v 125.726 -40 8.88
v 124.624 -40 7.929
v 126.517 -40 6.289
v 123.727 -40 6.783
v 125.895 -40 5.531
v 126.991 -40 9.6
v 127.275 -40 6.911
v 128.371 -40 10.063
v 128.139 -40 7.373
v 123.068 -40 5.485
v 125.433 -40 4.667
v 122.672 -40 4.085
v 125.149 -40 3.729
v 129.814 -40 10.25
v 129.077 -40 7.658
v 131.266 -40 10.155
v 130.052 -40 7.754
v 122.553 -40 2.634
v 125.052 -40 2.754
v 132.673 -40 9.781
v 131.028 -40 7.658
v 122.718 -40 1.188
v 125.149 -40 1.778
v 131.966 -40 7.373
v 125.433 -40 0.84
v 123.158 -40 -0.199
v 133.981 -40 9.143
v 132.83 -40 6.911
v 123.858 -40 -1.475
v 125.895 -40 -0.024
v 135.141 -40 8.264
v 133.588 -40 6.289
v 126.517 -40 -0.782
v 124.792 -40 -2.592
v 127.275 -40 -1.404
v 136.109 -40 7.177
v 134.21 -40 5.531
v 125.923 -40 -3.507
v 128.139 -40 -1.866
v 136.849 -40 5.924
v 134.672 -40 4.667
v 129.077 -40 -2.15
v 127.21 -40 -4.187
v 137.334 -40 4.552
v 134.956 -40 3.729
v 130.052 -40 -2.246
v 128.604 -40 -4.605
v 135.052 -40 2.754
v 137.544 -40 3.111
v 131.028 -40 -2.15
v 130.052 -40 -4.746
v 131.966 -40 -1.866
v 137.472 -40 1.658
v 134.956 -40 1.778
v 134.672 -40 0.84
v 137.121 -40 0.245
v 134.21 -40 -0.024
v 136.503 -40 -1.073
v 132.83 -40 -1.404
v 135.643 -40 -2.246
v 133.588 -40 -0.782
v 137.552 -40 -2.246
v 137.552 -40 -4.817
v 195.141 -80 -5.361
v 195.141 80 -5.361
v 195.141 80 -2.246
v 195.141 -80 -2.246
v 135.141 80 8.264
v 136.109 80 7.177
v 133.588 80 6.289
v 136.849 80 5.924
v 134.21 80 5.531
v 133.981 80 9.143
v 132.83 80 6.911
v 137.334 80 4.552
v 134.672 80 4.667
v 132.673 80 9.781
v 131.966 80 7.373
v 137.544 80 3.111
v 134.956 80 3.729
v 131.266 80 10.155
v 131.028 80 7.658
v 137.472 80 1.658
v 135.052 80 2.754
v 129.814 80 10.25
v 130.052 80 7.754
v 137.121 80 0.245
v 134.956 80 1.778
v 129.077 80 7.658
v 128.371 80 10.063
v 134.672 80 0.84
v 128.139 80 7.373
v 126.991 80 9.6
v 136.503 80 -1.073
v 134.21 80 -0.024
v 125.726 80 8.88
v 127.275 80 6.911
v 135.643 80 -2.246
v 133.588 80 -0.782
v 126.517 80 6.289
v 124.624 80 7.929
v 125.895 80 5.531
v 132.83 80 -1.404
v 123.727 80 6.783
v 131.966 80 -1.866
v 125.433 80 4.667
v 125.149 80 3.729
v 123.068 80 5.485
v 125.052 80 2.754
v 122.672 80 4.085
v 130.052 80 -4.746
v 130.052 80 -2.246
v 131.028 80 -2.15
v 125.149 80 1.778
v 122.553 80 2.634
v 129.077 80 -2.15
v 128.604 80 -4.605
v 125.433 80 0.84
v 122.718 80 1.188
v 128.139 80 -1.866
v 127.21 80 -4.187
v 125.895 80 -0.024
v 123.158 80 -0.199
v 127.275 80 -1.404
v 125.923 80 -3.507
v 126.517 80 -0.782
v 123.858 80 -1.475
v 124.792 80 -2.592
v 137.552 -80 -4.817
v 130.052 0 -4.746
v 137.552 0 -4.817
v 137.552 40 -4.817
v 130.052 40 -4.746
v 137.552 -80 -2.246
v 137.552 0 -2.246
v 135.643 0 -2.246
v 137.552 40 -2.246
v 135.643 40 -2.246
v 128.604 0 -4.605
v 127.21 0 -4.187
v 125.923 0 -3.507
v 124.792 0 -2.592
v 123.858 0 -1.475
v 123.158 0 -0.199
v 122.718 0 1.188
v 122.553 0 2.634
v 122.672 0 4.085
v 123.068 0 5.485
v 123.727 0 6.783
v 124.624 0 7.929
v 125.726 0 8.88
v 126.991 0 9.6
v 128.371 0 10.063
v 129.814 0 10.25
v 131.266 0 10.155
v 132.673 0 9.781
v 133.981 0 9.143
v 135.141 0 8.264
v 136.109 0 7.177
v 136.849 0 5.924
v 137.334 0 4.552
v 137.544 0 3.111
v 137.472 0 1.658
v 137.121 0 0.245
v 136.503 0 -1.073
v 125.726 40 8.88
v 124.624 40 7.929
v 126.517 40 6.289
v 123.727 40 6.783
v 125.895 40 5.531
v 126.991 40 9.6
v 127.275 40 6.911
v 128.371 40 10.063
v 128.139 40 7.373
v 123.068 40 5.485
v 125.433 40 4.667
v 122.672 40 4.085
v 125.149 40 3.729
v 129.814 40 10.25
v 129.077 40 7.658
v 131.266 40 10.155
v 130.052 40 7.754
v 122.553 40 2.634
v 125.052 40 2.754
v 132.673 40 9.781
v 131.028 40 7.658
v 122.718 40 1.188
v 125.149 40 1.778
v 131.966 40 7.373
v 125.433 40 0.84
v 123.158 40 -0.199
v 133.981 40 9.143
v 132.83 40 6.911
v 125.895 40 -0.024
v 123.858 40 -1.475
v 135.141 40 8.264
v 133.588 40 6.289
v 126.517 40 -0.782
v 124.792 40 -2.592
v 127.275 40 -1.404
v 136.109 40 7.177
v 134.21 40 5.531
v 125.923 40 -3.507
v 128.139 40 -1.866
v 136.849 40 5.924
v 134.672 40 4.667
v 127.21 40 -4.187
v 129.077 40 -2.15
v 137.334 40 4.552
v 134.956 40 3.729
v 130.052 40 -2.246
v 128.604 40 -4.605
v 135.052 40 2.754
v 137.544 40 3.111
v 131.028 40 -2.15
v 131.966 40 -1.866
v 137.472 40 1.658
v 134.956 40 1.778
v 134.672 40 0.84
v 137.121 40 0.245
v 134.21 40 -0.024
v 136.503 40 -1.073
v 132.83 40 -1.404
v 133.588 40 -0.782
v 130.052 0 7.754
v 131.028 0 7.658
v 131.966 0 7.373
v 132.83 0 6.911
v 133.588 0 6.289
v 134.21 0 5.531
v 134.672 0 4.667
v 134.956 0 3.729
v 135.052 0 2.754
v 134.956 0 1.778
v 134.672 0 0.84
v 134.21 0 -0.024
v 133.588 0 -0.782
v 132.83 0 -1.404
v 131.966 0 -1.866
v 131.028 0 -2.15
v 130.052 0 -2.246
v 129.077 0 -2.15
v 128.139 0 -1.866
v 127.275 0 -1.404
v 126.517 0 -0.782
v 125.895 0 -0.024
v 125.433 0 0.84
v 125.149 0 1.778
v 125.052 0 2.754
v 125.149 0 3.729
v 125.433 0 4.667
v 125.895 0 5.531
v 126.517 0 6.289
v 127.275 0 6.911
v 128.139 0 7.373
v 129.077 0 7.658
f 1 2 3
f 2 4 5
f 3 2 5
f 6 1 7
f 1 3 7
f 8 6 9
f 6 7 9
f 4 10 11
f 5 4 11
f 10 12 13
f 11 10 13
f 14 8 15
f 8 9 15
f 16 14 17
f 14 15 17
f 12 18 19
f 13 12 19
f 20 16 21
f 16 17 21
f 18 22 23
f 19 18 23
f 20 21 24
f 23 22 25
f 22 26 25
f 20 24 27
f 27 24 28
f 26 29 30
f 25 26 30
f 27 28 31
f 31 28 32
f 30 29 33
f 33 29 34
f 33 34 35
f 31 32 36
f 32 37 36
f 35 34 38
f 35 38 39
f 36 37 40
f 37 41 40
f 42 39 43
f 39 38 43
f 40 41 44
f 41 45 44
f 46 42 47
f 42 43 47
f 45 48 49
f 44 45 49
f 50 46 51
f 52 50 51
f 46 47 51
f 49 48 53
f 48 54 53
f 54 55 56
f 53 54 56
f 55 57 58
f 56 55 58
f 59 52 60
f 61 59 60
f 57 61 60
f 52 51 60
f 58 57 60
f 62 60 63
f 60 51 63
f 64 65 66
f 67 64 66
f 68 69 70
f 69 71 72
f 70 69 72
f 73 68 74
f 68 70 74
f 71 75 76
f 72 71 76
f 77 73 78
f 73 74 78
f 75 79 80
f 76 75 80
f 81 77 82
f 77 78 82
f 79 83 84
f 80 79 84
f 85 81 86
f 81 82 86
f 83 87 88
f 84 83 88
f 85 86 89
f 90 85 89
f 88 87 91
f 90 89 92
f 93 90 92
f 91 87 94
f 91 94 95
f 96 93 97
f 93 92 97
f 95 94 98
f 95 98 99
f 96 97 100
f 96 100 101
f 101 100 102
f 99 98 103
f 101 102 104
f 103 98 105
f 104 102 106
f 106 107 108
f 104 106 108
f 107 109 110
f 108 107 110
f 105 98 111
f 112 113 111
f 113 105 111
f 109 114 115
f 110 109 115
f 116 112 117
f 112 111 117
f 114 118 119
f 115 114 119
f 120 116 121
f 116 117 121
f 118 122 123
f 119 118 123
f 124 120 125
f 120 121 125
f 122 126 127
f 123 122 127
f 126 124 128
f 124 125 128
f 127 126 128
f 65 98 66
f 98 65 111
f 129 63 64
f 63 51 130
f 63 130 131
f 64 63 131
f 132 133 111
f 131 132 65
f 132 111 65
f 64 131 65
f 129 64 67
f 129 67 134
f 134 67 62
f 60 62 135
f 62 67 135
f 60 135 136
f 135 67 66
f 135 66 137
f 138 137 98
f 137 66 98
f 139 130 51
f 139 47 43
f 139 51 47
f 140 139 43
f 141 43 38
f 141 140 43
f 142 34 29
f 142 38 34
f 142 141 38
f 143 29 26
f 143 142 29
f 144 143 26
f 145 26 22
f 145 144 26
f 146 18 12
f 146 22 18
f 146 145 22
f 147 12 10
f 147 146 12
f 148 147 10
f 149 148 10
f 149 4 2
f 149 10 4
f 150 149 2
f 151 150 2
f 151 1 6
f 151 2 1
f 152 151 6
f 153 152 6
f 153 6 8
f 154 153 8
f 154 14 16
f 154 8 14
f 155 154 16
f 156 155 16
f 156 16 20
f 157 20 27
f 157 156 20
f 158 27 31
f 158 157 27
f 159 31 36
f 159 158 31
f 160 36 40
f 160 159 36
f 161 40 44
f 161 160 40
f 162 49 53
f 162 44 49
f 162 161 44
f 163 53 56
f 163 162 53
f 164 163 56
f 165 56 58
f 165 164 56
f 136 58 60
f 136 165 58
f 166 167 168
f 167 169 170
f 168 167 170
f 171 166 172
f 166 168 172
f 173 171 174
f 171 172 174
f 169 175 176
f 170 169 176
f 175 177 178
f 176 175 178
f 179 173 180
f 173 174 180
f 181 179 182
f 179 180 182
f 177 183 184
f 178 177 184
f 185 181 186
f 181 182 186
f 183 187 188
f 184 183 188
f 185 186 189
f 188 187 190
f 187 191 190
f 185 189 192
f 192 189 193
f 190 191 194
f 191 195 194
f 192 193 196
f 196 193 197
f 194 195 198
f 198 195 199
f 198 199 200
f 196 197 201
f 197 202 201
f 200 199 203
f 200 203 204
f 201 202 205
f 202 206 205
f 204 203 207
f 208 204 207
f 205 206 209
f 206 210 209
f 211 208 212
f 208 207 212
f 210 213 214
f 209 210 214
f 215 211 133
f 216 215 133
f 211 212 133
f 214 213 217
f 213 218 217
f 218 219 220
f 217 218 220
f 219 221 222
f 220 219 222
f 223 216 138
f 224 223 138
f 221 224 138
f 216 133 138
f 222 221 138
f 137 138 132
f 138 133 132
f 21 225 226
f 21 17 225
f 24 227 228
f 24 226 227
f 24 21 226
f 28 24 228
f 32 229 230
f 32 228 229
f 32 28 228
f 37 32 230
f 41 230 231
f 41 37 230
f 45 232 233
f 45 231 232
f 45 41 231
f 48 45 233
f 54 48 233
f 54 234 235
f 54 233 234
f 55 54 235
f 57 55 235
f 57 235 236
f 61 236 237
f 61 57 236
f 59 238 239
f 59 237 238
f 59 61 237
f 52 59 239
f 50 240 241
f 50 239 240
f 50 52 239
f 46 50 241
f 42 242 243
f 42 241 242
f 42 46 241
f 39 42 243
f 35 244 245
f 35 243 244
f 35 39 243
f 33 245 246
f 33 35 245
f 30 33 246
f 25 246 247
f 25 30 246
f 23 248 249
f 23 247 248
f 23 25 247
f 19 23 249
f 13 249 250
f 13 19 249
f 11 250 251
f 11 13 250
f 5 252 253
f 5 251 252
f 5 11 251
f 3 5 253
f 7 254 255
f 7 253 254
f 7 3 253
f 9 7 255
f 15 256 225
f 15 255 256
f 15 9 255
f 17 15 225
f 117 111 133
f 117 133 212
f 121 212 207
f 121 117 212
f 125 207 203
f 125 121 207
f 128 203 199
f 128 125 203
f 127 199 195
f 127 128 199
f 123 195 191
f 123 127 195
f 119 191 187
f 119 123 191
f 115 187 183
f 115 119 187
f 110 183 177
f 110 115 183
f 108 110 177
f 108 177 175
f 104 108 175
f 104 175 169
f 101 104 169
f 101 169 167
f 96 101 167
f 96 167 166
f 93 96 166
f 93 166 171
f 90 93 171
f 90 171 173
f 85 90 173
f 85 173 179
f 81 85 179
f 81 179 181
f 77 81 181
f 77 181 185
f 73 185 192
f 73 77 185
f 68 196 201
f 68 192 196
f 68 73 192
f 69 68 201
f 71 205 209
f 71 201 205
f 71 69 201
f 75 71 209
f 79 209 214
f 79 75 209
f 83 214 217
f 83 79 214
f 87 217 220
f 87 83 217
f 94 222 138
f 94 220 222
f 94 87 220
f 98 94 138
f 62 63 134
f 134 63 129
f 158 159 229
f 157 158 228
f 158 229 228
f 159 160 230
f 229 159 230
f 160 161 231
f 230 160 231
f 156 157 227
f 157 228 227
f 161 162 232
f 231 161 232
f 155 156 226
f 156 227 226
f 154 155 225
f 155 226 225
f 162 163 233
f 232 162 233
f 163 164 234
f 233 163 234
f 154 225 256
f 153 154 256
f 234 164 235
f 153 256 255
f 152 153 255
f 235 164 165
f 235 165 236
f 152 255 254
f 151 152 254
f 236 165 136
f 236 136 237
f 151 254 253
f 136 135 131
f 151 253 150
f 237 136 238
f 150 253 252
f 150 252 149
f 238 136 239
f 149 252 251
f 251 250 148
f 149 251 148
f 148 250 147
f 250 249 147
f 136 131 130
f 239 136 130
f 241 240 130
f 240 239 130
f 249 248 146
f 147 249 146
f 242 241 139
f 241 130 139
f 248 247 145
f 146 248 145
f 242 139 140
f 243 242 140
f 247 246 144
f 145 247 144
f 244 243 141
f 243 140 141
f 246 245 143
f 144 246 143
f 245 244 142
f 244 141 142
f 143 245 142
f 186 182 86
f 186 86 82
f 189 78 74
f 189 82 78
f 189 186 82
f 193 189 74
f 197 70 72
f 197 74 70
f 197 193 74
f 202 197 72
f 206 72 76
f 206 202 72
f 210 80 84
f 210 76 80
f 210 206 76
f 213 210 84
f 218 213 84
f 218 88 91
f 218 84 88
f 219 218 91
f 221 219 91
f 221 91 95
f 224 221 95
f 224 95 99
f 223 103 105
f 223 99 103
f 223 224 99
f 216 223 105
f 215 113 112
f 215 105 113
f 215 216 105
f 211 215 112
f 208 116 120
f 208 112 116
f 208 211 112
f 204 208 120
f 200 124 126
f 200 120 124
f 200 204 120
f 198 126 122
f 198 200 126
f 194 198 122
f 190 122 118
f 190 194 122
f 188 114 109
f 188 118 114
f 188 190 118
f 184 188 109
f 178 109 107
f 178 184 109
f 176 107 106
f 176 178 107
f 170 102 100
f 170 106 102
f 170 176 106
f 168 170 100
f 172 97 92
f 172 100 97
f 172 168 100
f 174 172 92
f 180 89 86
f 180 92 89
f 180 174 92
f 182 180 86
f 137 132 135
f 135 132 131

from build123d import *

# Parameters (mm, degrees)
SKETCH1_R               = 7.5
SKETCH1_R_2             = 5
BOSS_EXTRUDE1_DEPTH     = 80
BOSS_EXTRUDE2_DEPTH     = 160
CUT_EXTRUDE1_DEPTH      = 212.272992998
CUT_EXTRUDE1_DEPTH_BACK = 212.272992998


with BuildPart() as part:
    # Sketch1 → Boss-Extrude1 (new, symmetric)
    with BuildSketch(Plane(origin=(0, 0, 0), x_dir=(1, 0, 0), z_dir=(0, 1, 0))):
        with Locations(Location((130.052474297, -2.753634589, 0), (0, 0, 270))):
            Circle(SKETCH1_R)
        with Locations(Location((130.052474297, -2.753634589, 0), (0, 0, 270))):
            Circle(SKETCH1_R_2, mode=Mode.SUBTRACT)
    extrude(amount=BOSS_EXTRUDE1_DEPTH, both=True)

    # Sketch2 → Boss-Extrude2 (add)
    with BuildSketch(Plane(origin=(0, 80, 0), x_dir=(1, 0, 0), z_dir=(0, 1, 0))):
        Polygon((130.052474297, 4.746365411), (195.141045325, 5.361337723), (195.141045325, 2.246365411), (130.052474297, 2.246365411), align=None)
    extrude(amount=-BOSS_EXTRUDE2_DEPTH)

    # Sketch3 → Cut-Extrude1 (cut, two sides: drawn at the far end of the back side and taken through both)
    with BuildSketch(Plane.XY.offset(-2.246365411).offset(-CUT_EXTRUDE1_DEPTH_BACK)):
        Polygon((101.023989242, 40), (137.552474297, 40), (137.552474297, 0), (107.599116552, 0), (107.599116552, -40), (137.552474297, -40), (137.552474297, -90), (101.023989242, -90), align=None)
    extrude(amount=CUT_EXTRUDE1_DEPTH + CUT_EXTRUDE1_DEPTH_BACK, mode=Mode.SUBTRACT)


solid = part.part
